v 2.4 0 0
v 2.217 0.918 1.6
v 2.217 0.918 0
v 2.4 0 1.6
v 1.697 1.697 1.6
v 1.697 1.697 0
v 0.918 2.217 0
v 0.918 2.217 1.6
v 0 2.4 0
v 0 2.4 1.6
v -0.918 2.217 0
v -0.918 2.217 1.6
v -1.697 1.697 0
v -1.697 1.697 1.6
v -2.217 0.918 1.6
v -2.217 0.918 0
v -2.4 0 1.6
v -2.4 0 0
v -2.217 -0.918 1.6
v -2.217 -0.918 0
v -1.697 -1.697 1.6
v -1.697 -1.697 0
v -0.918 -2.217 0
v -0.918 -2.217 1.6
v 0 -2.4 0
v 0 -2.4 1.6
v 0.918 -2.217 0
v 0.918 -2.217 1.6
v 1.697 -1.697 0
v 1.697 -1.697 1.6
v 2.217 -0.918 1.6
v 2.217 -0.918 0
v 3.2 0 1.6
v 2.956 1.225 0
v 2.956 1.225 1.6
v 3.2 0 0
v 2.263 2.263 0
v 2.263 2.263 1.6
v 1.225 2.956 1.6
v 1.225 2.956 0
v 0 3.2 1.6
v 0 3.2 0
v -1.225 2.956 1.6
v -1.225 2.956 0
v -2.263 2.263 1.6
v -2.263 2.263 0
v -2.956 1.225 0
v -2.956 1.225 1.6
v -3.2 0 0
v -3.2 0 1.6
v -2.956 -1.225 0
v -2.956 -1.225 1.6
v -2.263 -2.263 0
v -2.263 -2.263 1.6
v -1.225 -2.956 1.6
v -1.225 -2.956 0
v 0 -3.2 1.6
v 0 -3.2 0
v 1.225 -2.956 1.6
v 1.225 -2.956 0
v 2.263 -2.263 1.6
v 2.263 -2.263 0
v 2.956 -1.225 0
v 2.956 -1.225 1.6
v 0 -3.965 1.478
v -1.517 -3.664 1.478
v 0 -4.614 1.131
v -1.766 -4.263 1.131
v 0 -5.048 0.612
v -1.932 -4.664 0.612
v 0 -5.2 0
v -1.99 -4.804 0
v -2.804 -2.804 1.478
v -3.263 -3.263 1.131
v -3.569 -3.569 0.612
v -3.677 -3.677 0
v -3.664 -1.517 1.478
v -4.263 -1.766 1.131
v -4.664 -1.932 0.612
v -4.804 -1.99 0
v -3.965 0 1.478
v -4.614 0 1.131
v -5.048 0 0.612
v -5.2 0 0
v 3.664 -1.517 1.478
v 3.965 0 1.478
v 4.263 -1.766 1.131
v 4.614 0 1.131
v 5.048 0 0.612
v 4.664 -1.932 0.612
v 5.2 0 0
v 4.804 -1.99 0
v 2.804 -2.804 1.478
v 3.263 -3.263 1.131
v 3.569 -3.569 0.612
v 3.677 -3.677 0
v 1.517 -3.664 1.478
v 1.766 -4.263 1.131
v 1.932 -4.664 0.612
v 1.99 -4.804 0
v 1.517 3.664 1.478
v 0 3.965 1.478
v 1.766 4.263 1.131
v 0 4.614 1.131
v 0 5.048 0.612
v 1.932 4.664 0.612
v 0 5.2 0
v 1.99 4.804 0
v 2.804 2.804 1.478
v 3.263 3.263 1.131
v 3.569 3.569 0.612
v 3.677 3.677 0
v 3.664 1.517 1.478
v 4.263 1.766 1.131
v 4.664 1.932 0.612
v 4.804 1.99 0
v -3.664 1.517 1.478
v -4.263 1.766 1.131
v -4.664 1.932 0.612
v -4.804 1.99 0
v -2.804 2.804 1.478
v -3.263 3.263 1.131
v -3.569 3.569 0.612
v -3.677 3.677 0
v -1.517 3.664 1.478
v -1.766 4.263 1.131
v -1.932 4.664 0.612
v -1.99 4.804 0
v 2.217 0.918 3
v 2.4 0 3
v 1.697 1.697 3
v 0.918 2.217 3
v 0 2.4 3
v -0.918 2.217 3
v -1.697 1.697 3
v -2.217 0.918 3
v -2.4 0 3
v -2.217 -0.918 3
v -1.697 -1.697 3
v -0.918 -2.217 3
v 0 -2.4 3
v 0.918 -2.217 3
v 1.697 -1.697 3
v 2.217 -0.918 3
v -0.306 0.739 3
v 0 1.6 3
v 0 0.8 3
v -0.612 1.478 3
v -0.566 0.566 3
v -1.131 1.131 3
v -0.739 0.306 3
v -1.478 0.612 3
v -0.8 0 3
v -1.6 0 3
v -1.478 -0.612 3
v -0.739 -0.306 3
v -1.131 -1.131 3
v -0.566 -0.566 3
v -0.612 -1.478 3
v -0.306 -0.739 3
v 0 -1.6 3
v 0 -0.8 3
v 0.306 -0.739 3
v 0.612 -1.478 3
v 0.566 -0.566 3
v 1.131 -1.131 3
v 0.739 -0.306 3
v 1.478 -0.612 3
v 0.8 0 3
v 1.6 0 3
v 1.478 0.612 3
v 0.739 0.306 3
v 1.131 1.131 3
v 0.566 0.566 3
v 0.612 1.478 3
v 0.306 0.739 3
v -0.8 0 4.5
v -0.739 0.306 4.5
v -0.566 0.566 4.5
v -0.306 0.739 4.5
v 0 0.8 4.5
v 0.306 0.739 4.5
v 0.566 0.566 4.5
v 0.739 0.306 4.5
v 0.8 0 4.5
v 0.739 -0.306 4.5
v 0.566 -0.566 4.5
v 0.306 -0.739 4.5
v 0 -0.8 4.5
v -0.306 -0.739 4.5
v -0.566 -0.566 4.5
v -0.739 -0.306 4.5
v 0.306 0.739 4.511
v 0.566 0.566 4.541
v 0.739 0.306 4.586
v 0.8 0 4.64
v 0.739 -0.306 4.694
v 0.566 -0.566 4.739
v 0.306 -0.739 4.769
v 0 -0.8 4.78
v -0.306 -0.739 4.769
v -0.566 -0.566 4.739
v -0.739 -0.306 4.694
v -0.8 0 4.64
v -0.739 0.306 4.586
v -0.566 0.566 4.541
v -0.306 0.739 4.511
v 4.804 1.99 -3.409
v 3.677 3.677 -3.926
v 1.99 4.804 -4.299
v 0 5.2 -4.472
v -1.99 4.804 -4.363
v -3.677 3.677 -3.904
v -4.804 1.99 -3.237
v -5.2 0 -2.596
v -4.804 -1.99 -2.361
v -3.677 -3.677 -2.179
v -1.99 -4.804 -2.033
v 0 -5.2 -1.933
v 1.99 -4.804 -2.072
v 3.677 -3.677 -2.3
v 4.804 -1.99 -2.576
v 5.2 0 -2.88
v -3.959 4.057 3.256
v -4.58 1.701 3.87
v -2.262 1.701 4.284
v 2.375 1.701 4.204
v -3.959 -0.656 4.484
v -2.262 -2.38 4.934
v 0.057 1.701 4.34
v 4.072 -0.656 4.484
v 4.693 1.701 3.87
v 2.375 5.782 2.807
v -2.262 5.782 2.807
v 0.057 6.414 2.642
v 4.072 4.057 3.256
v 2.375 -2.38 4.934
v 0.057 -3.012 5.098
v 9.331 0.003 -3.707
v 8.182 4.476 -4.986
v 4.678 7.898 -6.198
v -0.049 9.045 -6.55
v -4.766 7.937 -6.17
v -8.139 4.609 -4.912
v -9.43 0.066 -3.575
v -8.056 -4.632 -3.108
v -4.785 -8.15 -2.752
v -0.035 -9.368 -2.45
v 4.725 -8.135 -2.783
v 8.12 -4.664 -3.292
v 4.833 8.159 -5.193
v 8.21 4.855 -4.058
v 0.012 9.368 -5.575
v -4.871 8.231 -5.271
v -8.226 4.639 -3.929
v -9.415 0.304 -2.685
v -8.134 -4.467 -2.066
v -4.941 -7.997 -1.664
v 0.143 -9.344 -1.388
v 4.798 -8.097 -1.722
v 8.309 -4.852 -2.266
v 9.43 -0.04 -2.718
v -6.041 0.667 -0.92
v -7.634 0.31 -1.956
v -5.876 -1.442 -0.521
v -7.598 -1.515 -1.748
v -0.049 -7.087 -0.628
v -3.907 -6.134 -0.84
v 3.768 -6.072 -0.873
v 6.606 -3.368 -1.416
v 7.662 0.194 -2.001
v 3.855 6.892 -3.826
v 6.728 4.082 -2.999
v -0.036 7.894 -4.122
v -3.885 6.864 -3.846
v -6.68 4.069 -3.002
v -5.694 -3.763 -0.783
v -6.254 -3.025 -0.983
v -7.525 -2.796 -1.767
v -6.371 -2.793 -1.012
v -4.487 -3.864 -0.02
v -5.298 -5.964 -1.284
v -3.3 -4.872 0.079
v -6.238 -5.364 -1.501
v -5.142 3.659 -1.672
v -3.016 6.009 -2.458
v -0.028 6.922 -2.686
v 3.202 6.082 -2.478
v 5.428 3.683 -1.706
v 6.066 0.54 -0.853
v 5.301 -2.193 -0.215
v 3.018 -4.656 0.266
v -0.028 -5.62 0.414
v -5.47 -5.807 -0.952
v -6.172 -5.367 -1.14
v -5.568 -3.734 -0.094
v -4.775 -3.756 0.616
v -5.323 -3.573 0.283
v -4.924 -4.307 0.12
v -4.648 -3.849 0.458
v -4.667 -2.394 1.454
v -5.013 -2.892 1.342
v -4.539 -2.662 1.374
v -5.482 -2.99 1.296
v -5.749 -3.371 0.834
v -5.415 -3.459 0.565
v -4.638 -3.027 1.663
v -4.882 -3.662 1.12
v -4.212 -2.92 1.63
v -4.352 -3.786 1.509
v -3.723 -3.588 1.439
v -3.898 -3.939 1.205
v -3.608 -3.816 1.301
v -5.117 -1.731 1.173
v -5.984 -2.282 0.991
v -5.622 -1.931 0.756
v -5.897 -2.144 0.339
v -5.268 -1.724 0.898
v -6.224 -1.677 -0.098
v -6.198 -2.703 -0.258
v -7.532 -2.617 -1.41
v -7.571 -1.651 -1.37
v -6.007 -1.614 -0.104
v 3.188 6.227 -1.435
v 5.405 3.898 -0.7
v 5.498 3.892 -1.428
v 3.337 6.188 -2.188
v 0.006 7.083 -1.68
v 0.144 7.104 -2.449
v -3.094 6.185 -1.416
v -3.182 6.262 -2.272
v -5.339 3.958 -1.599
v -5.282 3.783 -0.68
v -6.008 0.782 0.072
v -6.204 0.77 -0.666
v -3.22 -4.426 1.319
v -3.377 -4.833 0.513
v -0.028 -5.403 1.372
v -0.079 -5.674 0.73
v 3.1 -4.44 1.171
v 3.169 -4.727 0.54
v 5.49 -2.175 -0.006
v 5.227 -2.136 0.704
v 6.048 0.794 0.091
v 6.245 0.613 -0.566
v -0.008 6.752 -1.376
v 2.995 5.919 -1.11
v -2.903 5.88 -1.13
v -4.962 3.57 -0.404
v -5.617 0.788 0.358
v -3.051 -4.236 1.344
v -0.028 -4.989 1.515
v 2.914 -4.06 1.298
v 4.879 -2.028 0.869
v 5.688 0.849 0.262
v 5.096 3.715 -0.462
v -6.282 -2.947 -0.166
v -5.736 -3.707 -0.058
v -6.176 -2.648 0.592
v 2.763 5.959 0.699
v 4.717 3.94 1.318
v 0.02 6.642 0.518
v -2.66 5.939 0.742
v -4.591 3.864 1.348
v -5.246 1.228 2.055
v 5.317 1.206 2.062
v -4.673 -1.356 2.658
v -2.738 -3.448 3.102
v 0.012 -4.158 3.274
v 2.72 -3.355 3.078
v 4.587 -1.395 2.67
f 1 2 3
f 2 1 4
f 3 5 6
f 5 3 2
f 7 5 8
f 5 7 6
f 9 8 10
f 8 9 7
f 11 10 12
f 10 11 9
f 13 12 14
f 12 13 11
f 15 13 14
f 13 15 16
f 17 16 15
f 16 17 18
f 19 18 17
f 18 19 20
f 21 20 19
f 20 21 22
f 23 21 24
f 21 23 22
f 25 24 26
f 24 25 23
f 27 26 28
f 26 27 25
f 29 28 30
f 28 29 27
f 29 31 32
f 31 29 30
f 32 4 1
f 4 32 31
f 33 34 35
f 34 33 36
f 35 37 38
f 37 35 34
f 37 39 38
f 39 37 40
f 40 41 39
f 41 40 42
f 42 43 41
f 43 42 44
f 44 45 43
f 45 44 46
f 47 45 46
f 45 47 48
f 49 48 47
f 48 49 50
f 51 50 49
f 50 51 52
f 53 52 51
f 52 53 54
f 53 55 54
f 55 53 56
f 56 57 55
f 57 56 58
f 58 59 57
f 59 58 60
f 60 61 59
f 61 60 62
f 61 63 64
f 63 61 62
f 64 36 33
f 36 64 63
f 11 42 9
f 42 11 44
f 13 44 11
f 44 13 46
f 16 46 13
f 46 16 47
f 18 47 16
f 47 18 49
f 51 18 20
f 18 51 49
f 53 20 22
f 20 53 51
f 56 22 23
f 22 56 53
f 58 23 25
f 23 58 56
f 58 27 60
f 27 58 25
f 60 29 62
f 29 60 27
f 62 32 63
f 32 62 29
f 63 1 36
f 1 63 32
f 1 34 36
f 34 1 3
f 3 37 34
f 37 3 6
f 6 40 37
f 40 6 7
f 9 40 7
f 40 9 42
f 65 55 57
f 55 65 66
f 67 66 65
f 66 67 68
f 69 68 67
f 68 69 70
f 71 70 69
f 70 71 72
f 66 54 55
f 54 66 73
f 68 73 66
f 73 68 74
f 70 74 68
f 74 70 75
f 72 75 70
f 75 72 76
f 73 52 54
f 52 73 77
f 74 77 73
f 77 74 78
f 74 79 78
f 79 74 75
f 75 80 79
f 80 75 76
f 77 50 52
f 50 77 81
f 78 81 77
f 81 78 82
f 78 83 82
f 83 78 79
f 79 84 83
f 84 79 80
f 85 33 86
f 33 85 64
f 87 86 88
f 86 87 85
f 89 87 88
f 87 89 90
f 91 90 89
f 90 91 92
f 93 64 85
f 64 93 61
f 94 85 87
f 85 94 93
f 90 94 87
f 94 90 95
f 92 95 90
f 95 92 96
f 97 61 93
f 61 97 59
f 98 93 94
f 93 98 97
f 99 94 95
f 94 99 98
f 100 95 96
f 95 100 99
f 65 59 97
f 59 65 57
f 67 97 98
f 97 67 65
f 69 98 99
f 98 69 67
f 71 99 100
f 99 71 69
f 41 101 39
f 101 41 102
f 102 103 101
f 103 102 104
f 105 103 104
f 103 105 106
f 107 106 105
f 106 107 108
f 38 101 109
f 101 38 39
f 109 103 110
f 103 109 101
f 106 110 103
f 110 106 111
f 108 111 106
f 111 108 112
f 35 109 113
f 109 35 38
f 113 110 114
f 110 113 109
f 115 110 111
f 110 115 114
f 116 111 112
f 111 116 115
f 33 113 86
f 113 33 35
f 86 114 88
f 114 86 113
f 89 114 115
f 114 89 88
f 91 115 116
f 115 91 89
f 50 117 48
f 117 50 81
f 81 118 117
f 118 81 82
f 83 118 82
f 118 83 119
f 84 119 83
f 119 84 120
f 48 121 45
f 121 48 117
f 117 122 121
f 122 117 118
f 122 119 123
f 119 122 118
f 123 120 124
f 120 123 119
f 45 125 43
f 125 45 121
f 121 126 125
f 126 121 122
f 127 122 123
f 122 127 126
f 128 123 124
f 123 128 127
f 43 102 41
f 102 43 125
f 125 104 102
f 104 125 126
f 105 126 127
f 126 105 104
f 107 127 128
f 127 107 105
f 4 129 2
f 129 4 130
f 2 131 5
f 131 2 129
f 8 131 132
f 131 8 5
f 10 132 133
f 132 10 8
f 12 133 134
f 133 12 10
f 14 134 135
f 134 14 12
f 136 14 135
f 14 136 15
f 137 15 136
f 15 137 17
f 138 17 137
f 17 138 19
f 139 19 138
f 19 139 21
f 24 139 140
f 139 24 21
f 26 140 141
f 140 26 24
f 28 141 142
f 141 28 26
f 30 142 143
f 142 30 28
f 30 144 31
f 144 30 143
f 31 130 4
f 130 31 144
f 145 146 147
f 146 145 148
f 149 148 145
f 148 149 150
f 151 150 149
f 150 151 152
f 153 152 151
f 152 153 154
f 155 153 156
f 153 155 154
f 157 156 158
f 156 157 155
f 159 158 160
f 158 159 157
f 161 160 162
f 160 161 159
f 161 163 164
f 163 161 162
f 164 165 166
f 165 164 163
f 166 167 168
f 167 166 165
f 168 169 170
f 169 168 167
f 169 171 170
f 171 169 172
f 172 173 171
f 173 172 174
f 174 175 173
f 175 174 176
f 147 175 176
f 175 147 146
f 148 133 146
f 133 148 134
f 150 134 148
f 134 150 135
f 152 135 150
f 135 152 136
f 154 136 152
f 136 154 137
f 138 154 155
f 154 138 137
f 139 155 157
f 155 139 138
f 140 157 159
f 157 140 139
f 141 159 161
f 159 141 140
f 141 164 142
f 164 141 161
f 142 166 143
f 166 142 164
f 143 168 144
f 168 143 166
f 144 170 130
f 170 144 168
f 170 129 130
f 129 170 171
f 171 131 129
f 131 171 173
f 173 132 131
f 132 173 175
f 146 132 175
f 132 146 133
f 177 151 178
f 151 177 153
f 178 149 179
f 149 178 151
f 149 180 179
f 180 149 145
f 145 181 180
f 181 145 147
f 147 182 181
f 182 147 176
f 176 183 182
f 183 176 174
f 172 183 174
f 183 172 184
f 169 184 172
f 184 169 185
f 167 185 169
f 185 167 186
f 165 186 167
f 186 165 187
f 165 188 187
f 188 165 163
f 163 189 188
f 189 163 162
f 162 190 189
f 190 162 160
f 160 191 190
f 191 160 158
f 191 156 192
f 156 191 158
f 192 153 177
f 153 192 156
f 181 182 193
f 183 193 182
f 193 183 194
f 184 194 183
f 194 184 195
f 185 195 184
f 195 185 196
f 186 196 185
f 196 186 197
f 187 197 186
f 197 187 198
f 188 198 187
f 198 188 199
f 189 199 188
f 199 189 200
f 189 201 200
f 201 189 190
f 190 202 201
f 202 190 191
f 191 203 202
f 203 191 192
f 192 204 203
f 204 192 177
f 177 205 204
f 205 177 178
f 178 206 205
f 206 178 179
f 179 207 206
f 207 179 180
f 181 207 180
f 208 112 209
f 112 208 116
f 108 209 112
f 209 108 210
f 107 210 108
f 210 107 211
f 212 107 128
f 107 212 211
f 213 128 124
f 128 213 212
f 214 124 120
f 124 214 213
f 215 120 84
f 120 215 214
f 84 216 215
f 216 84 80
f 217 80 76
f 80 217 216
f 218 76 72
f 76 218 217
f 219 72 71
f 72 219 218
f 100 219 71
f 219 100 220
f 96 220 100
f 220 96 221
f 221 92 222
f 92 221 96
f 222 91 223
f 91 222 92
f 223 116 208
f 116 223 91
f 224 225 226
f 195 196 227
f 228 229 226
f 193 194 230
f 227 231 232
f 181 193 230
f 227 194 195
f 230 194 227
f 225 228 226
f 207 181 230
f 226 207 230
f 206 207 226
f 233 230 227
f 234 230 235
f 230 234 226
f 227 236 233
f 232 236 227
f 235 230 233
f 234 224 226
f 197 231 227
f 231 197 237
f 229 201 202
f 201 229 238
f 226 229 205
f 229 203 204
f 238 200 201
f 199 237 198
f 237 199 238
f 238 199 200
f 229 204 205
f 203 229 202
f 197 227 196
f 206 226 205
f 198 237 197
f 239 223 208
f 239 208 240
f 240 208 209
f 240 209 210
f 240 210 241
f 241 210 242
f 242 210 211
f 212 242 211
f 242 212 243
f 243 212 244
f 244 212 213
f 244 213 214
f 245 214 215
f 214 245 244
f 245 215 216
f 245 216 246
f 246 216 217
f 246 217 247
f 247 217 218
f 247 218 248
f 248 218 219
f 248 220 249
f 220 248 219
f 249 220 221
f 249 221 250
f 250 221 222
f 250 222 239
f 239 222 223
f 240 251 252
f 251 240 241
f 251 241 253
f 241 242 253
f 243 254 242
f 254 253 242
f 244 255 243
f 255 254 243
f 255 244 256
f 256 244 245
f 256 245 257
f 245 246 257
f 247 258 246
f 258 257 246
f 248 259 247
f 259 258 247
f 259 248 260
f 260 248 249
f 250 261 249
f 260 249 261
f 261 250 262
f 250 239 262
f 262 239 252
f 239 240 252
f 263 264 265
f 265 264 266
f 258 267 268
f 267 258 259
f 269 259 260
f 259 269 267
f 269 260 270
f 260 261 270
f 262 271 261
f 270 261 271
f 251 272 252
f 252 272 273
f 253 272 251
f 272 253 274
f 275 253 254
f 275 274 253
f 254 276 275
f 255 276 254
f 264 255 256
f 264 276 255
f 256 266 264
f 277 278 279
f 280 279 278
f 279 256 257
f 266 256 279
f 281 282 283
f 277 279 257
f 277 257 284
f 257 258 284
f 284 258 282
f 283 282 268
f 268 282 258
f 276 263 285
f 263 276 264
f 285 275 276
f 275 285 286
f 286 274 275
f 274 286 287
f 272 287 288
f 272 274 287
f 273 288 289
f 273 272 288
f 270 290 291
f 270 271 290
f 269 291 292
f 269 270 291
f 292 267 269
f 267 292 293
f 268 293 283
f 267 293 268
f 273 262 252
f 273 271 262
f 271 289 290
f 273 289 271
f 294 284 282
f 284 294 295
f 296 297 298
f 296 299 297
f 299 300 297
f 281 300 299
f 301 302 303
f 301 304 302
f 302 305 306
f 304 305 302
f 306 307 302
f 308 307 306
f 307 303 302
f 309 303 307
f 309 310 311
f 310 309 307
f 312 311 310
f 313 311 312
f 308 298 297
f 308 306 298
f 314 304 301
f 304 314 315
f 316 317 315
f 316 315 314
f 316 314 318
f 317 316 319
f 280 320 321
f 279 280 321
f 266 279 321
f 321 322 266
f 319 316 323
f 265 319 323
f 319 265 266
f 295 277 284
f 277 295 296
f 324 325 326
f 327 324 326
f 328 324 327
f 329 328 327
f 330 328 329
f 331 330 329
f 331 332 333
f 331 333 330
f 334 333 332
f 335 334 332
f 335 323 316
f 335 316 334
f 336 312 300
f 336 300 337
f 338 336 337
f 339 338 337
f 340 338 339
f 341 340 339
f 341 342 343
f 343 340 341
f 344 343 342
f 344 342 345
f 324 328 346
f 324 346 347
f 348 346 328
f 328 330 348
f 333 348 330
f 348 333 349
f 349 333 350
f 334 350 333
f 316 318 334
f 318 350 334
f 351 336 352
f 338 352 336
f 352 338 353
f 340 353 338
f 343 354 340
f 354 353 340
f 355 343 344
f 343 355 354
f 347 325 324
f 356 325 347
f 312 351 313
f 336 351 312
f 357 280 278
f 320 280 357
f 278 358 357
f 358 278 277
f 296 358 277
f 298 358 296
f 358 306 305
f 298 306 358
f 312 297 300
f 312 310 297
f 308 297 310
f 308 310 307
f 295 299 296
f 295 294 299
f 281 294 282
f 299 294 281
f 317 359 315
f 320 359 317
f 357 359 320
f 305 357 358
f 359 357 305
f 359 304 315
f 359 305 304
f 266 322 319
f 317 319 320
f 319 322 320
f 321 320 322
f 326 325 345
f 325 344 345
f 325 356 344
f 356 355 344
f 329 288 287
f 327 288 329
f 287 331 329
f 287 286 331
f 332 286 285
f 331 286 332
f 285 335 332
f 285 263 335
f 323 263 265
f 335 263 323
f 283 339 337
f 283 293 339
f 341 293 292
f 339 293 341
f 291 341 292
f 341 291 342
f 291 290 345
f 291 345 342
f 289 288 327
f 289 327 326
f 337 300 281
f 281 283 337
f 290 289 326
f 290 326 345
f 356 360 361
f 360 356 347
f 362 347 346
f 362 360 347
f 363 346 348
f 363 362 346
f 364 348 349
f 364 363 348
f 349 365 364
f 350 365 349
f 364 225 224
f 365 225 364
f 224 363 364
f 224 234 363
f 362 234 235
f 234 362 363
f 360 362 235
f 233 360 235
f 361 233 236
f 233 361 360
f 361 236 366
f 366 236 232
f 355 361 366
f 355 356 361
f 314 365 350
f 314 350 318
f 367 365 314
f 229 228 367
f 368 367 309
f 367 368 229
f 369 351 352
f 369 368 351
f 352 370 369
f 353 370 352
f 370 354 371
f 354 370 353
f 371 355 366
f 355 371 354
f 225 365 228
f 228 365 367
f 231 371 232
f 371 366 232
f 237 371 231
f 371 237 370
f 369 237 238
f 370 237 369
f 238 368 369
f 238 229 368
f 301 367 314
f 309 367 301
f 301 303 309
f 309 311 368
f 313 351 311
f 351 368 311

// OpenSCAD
use <../lib.scad>
use <s/13788s01.scad>
use <s/13788s02.scad>
$fa=1; $fs=0.2;
function ldraw_lib__13788(realsolid=false) = [
// 0 Minifig Hat with Wide Brim Down
// 0 Name: 13788.dat
// 0 Author: Stan Isachenko [angmarec]
// 0 !LDRAW_ORG Part UPDATE 2014-01
// 0 !LICENSE Licensed under CC BY 2.0 and CC BY 4.0 : see CAreadme.txt
// 
// 0 BFC CERTIFY CCW
  [0,"BFC","CERTIFY"],
  [0,"BFC","CCW"],
// 
// 0 !CATEGORY Minifig Headwear
// 
// 0 !HISTORY 2014-01-08 {LEGO Digital Designer} Original part shape
// 0 !HISTORY 2014-01-08 [angmarec] File preparation for LDraw Parts Tracker
// 0 !HISTORY 2014-01-19 [MagFors] Rearranged subfiles structure
// 0 !HISTORY 2014-06-21 [PTadmin] Official Update 2014-01
// 
// 
// 1 16 0 0 0 1 0 0 0 1 0 0 0 1 s\13788s01.dat
  [1,16,0,0,0,1,0,0,0,1,0,0,0,1, ldraw_lib__s__13788s01(realsolid)],
// 1 16 0 0 0 1 0 0 0 1 0 0 0 1 s\13788s02.dat
  [1,16,0,0,0,1,0,0,0,1,0,0,0,1, ldraw_lib__s__13788s02(realsolid)],
// 
// 0 // outside surface
// 4 16 6.907 -1.747 14.898 11.792 -3.294 9.851 12.74 1.155 9.288 7.488 2.776 14.797
  [4,16,6.907,-1.747,14.898,11.792,-3.294,9.851,12.74,1.155,9.288,7.488,2.776,14.797],
// 3 16 0.051 -1.296 16.604 7.488 2.776 14.797 -0.02 3.441 16.88
  [3,16,0.051,-1.296,16.604,7.488,2.776,14.797,-0.02,3.441,16.88],
// 3 16 0.051 -1.296 16.604 6.907 -1.747 14.898 7.488 2.776 14.797
  [3,16,0.051,-1.296,16.604,6.907,-1.747,14.898,7.488,2.776,14.797],
// 3 16 -6.649 -1.855 14.847 -0.02 3.441 16.88 -7.258 2.825 14.701
  [3,16,-6.649,-1.855,14.847,-0.02,3.441,16.88,-7.258,2.825,14.701],
// 3 16 -6.649 -1.855 14.847 0.051 -1.296 16.604 -0.02 3.441 16.88
  [3,16,-6.649,-1.855,14.847,0.051,-1.296,16.604,-0.02,3.441,16.88],
// 3 16 -11.478 -3.371 9.659 -7.258 2.825 14.701 -12.405 1.01 8.925
  [3,16,-11.478,-3.371,9.659,-7.258,2.825,14.701,-12.405,1.01,8.925],
// 3 16 -11.478 -3.371 9.659 -6.649 -1.855 14.847 -7.258 2.825 14.701
  [3,16,-11.478,-3.371,9.659,-6.649,-1.855,14.847,-7.258,2.825,14.701],
// 3 16 -12.405 1.01 8.925 -13.115 -5.138 3.069 -11.478 -3.371 9.659
  [3,16,-12.405,1.01,8.925,-13.115,-5.138,3.069,-11.478,-3.371,9.659],
// 3 16 -14.043 -0.895 1.971 -13.115 -5.138 3.069 -12.405 1.01 8.925
  [3,16,-14.043,-0.895,1.971,-13.115,-5.138,3.069,-12.405,1.01,8.925],
// 3 16 -11.478 -3.371 9.659 -11.45 -9.676 4.252 -9.897 -8.14 10.143
  [3,16,-11.478,-3.371,9.659,-11.45,-9.676,4.252,-9.897,-8.14,10.143],
// 3 16 -13.115 -5.138 3.069 -11.45 -9.676 4.252 -11.478 -3.371 9.659
  [3,16,-13.115,-5.138,3.069,-11.45,-9.676,4.252,-11.478,-3.371,9.659],
// 3 16 -9.897 -8.14 10.143 -6.649 -1.855 14.847 -11.478 -3.371 9.659
  [3,16,-9.897,-8.14,10.143,-6.649,-1.855,14.847,-11.478,-3.371,9.659],
// 3 16 -9.897 -8.14 10.143 -5.654 -7.017 14.456 -6.649 -1.855 14.847
  [3,16,-9.897,-8.14,10.143,-5.654,-7.017,14.456,-6.649,-1.855,14.847],
// 4 16 -5.654 -7.017 14.456 0.142 -6.605 16.034 0.051 -1.296 16.604 -6.649 -1.855 14.847
  [4,16,-5.654,-7.017,14.456,0.142,-6.605,16.034,0.051,-1.296,16.604,-6.649,-1.855,14.847],
// 3 16 6.907 -1.747 14.898 0.051 -1.296 16.604 0.142 -6.605 16.034
  [3,16,6.907,-1.747,14.898,0.051,-1.296,16.604,0.142,-6.605,16.034],
// 3 16 5.937 -7.017 14.456 6.907 -1.747 14.898 0.142 -6.605 16.034
  [3,16,5.937,-7.017,14.456,6.907,-1.747,14.898,0.142,-6.605,16.034],
// 4 16 11.792 -3.294 9.851 6.907 -1.747 14.898 5.937 -7.017 14.456 10.18 -8.14 10.143
  [4,16,11.792,-3.294,9.851,6.907,-1.747,14.898,5.937,-7.017,14.456,10.18,-8.14,10.143],
// 3 16 11.792 -3.294 9.851 10.18 -8.14 10.143 13.293 -5.156 3.016
  [3,16,11.792,-3.294,9.851,10.18,-8.14,10.143,13.293,-5.156,3.016],
// 3 16 13.293 -5.156 3.016 10.18 -8.14 10.143 11.733 -9.676 4.252
  [3,16,13.293,-5.156,3.016,10.18,-8.14,10.143,11.733,-9.676,4.252],
// 3 16 14.219 -0.654 2.122 11.792 -3.294 9.851 13.293 -5.156 3.016
  [3,16,14.219,-0.654,2.122,11.792,-3.294,9.851,13.293,-5.156,3.016],
// 3 16 14.219 -0.654 2.122 12.74 1.155 9.288 11.792 -3.294 9.851
  [3,16,14.219,-0.654,2.122,12.74,1.155,9.288,11.792,-3.294,9.851],
// 3 16 -12.792 -2.933 -4.328 -13.115 -5.138 3.069 -14.043 -0.895 1.971
  [3,16,-12.792,-2.933,-4.328,-13.115,-5.138,3.069,-14.043,-0.895,1.971],
// 3 16 -12.792 -2.933 -4.328 -14.043 -0.895 1.971 -13.17 -2.244 -4.31
  [3,16,-12.792,-2.933,-4.328,-14.043,-0.895,1.971,-13.17,-2.244,-4.31],
// 3 16 -11.683 -6.645 -3.391 -13.115 -5.138 3.069 -12.792 -2.933 -4.328
  [3,16,-11.683,-6.645,-3.391,-13.115,-5.138,3.069,-12.792,-2.933,-4.328],
// 3 16 -5.654 -12.335 -5.951 -9.897 -11.211 -1.639 -11.683 -6.645 -3.391
  [3,16,-5.654,-12.335,-5.951,-9.897,-11.211,-1.639,-11.683,-6.645,-3.391],
// 4 16 -6.846 -7.755 -8.62 -5.654 -12.335 -5.951 -11.683 -6.645 -3.391 -10.531 -4.075 -7.3
  [4,16,-6.846,-7.755,-8.62,-5.654,-12.335,-5.951,-11.683,-6.645,-3.391,-10.531,-4.075,-7.3],
// 3 16 0.031 -8.185 -10.395 -7.628 -3.36 -10.591 -0.07 -3.788 -12.472
  [3,16,0.031,-8.185,-10.395,-7.628,-3.36,-10.591,-0.07,-3.788,-12.472],
// 3 16 0.031 -8.185 -10.395 -6.846 -7.755 -8.62 -7.628 -3.36 -10.591
  [3,16,0.031,-8.185,-10.395,-6.846,-7.755,-8.62,-7.628,-3.36,-10.591],
// 3 16 -0.07 -3.788 -12.472 6.8 -7.694 -8.387 0.031 -8.185 -10.395
  [3,16,-0.07,-3.788,-12.472,6.8,-7.694,-8.387,0.031,-8.185,-10.395],
// 3 16 7.286 -3.244 -10.151 6.8 -7.694 -8.387 -0.07 -3.788 -12.472
  [3,16,7.286,-3.244,-10.151,6.8,-7.694,-8.387,-0.07,-3.788,-12.472],
// 4 16 11.467 -6.674 -3.488 6.8 -7.694 -8.387 7.286 -3.244 -10.151 12.198 -2.173 -5.07
  [4,16,11.467,-6.674,-3.488,6.8,-7.694,-8.387,7.286,-3.244,-10.151,12.198,-2.173,-5.07],
// 4 16 13.293 -5.156 3.016 11.467 -6.674 -3.488 12.198 -2.173 -5.07 14.219 -0.654 2.122
  [4,16,13.293,-5.156,3.016,11.467,-6.674,-3.488,12.198,-2.173,-5.07,14.219,-0.654,2.122],
// 3 16 -11.45 -9.676 4.252 -13.115 -5.138 3.069 -9.897 -11.211 -1.639
  [3,16,-11.45,-9.676,4.252,-13.115,-5.138,3.069,-9.897,-11.211,-1.639],
// 3 16 -9.897 -11.211 -1.639 -13.115 -5.138 3.069 -11.683 -6.645 -3.391
  [3,16,-9.897,-11.211,-1.639,-13.115,-5.138,3.069,-11.683,-6.645,-3.391],
// 3 16 10.18 -11.211 -1.639 11.467 -6.674 -3.488 11.733 -9.676 4.252
  [3,16,10.18,-11.211,-1.639,11.467,-6.674,-3.488,11.733,-9.676,4.252],
// 3 16 11.467 -6.674 -3.488 13.293 -5.156 3.016 11.733 -9.676 4.252
  [3,16,11.467,-6.674,-3.488,13.293,-5.156,3.016,11.733,-9.676,4.252],
// 4 16 10.18 -11.211 -1.639 5.937 -12.335 -5.951 6.8 -7.694 -8.387 11.467 -6.674 -3.488
  [4,16,10.18,-11.211,-1.639,5.937,-12.335,-5.951,6.8,-7.694,-8.387,11.467,-6.674,-3.488],
// 3 16 0.031 -8.185 -10.395 5.937 -12.335 -5.951 0.142 -12.746 -7.53
  [3,16,0.031,-8.185,-10.395,5.937,-12.335,-5.951,0.142,-12.746,-7.53],
// 3 16 6.8 -7.694 -8.387 5.937 -12.335 -5.951 0.031 -8.185 -10.395
  [3,16,6.8,-7.694,-8.387,5.937,-12.335,-5.951,0.031,-8.185,-10.395],
// 3 16 0.142 -12.746 -7.53 -6.846 -7.755 -8.62 0.031 -8.185 -10.395
  [3,16,0.142,-12.746,-7.53,-6.846,-7.755,-8.62,0.031,-8.185,-10.395],
// 3 16 0.142 -12.746 -7.53 -5.654 -12.335 -5.951 -6.846 -7.755 -8.62
  [3,16,0.142,-12.746,-7.53,-5.654,-12.335,-5.951,-6.846,-7.755,-8.62],
// 3 16 -11.667 -3.635 -5.986 -11.683 -6.645 -3.391 -12.792 -2.933 -4.328
  [3,16,-11.667,-3.635,-5.986,-11.683,-6.645,-3.391,-12.792,-2.933,-4.328],
// 3 16 -10.531 -4.075 -7.3 -11.683 -6.645 -3.391 -11.667 -3.635 -5.986
  [3,16,-10.531,-4.075,-7.3,-11.683,-6.645,-3.391,-11.667,-3.635,-5.986],
// 3 16 -11.667 -3.635 -5.986 -11.348 -3.434 -6.656 -10.531 -4.075 -7.3
  [3,16,-11.667,-3.635,-5.986,-11.348,-3.434,-6.656,-10.531,-4.075,-7.3],
// 3 16 -10.531 -4.075 -7.3 -9.307 -3.597 -8.97 -6.846 -7.755 -8.62
  [3,16,-10.531,-4.075,-7.3,-9.307,-3.597,-8.97,-6.846,-7.755,-8.62],
// 3 16 -9.019 -3.253 -9.541 -7.628 -3.36 -10.591 -9.307 -3.597 -8.97
  [3,16,-9.019,-3.253,-9.541,-7.628,-3.36,-10.591,-9.307,-3.597,-8.97],
// 3 16 -7.628 -3.36 -10.591 -6.846 -7.755 -8.62 -9.307 -3.597 -8.97
  [3,16,-7.628,-3.36,-10.591,-6.846,-7.755,-8.62,-9.307,-3.597,-8.97],
// 5 24 11.792 -3.294 9.851 12.74 1.155 9.288 6.907 -1.747 14.898 14.219 -0.654 2.122
  [5,24,11.792,-3.294,9.851,12.74,1.155,9.288,6.907,-1.747,14.898,14.219,-0.654,2.122],
// 5 24 6.907 -1.747 14.898 11.792 -3.294 9.851 12.74 1.155 9.288 5.937 -7.017 14.456
  [5,24,6.907,-1.747,14.898,11.792,-3.294,9.851,12.74,1.155,9.288,5.937,-7.017,14.456],
// 5 24 7.488 2.776 14.797 6.907 -1.747 14.898 12.74 1.155 9.288 0.051 -1.296 16.604
  [5,24,7.488,2.776,14.797,6.907,-1.747,14.898,12.74,1.155,9.288,0.051,-1.296,16.604],
// 5 24 -0.02 3.441 16.88 0.051 -1.296 16.604 7.488 2.776 14.797 -6.649 -1.855 14.847
  [5,24,-0.02,3.441,16.88,0.051,-1.296,16.604,7.488,2.776,14.797,-6.649,-1.855,14.847],
// 5 24 0.051 -1.296 16.604 7.488 2.776 14.797 -0.02 3.441 16.88 6.907 -1.747 14.898
  [5,24,0.051,-1.296,16.604,7.488,2.776,14.797,-0.02,3.441,16.88,6.907,-1.747,14.898],
// 5 24 0.051 -1.296 16.604 6.907 -1.747 14.898 7.488 2.776 14.797 0.142 -6.605 16.034
  [5,24,0.051,-1.296,16.604,6.907,-1.747,14.898,7.488,2.776,14.797,0.142,-6.605,16.034],
// 5 24 -7.258 2.825 14.701 -6.649 -1.855 14.847 -0.02 3.441 16.88 -11.478 -3.371 9.659
  [5,24,-7.258,2.825,14.701,-6.649,-1.855,14.847,-0.02,3.441,16.88,-11.478,-3.371,9.659],
// 5 24 -6.649 -1.855 14.847 -0.02 3.441 16.88 -7.258 2.825 14.701 0.051 -1.296 16.604
  [5,24,-6.649,-1.855,14.847,-0.02,3.441,16.88,-7.258,2.825,14.701,0.051,-1.296,16.604],
// 5 24 -6.649 -1.855 14.847 0.051 -1.296 16.604 -0.02 3.441 16.88 -5.654 -7.017 14.456
  [5,24,-6.649,-1.855,14.847,0.051,-1.296,16.604,-0.02,3.441,16.88,-5.654,-7.017,14.456],
// 5 24 -12.405 1.01 8.925 -11.478 -3.371 9.659 -7.258 2.825 14.701 -13.115 -5.138 3.069
  [5,24,-12.405,1.01,8.925,-11.478,-3.371,9.659,-7.258,2.825,14.701,-13.115,-5.138,3.069],
// 5 24 -11.478 -3.371 9.659 -7.258 2.825 14.701 -12.405 1.01 8.925 -6.649 -1.855 14.847
  [5,24,-11.478,-3.371,9.659,-7.258,2.825,14.701,-12.405,1.01,8.925,-6.649,-1.855,14.847],
// 5 24 -11.478 -3.371 9.659 -6.649 -1.855 14.847 -7.258 2.825 14.701 -9.897 -8.14 10.143
  [5,24,-11.478,-3.371,9.659,-6.649,-1.855,14.847,-7.258,2.825,14.701,-9.897,-8.14,10.143],
// 5 24 -12.405 1.01 8.925 -13.115 -5.138 3.069 -11.478 -3.371 9.659 -14.043 -0.895 1.971
  [5,24,-12.405,1.01,8.925,-13.115,-5.138,3.069,-11.478,-3.371,9.659,-14.043,-0.895,1.971],
// 5 24 -13.115 -5.138 3.069 -11.478 -3.371 9.659 -12.405 1.01 8.925 -11.45 -9.676 4.252
  [5,24,-13.115,-5.138,3.069,-11.478,-3.371,9.659,-12.405,1.01,8.925,-11.45,-9.676,4.252],
// 5 24 -14.043 -0.895 1.971 -13.115 -5.138 3.069 -12.405 1.01 8.925 -12.792 -2.933 -4.328
  [5,24,-14.043,-0.895,1.971,-13.115,-5.138,3.069,-12.405,1.01,8.925,-12.792,-2.933,-4.328],
// 5 24 -9.897 -8.14 10.143 -11.478 -3.371 9.659 -11.45 -9.676 4.252 -6.649 -1.855 14.847
  [5,24,-9.897,-8.14,10.143,-11.478,-3.371,9.659,-11.45,-9.676,4.252,-6.649,-1.855,14.847],
// 5 24 -11.478 -3.371 9.659 -11.45 -9.676 4.252 -9.897 -8.14 10.143 -13.115 -5.138 3.069
  [5,24,-11.478,-3.371,9.659,-11.45,-9.676,4.252,-9.897,-8.14,10.143,-13.115,-5.138,3.069],
// 5 24 -13.115 -5.138 3.069 -11.45 -9.676 4.252 -11.478 -3.371 9.659 -9.897 -11.211 -1.639
  [5,24,-13.115,-5.138,3.069,-11.45,-9.676,4.252,-11.478,-3.371,9.659,-9.897,-11.211,-1.639],
// 5 24 -9.897 -8.14 10.143 -6.649 -1.855 14.847 -11.478 -3.371 9.659 -5.654 -7.017 14.456
  [5,24,-9.897,-8.14,10.143,-6.649,-1.855,14.847,-11.478,-3.371,9.659,-5.654,-7.017,14.456],
// 5 24 -5.654 -7.017 14.456 -6.649 -1.855 14.847 -9.897 -8.14 10.143 0.051 -1.296 16.604
  [5,24,-5.654,-7.017,14.456,-6.649,-1.855,14.847,-9.897,-8.14,10.143,0.051,-1.296,16.604],
// 5 24 0.142 -6.605 16.034 0.051 -1.296 16.604 -5.654 -7.017 14.456 6.907 -1.747 14.898
  [5,24,0.142,-6.605,16.034,0.051,-1.296,16.604,-5.654,-7.017,14.456,6.907,-1.747,14.898],
// 5 24 0.142 -6.605 16.034 6.907 -1.747 14.898 0.051 -1.296 16.604 5.937 -7.017 14.456
  [5,24,0.142,-6.605,16.034,6.907,-1.747,14.898,0.051,-1.296,16.604,5.937,-7.017,14.456],
// 5 24 5.937 -7.017 14.456 6.907 -1.747 14.898 0.142 -6.605 16.034 11.792 -3.294 9.851
  [5,24,5.937,-7.017,14.456,6.907,-1.747,14.898,0.142,-6.605,16.034,11.792,-3.294,9.851],
// 5 24 10.18 -8.14 10.143 11.792 -3.294 9.851 5.937 -7.017 14.456 13.293 -5.156 3.016
  [5,24,10.18,-8.14,10.143,11.792,-3.294,9.851,5.937,-7.017,14.456,13.293,-5.156,3.016],
// 5 24 10.18 -8.14 10.143 13.293 -5.156 3.016 11.792 -3.294 9.851 11.733 -9.676 4.252
  [5,24,10.18,-8.14,10.143,13.293,-5.156,3.016,11.792,-3.294,9.851,11.733,-9.676,4.252],
// 5 24 13.293 -5.156 3.016 11.792 -3.294 9.851 10.18 -8.14 10.143 14.219 -0.654 2.122
  [5,24,13.293,-5.156,3.016,11.792,-3.294,9.851,10.18,-8.14,10.143,14.219,-0.654,2.122],
// 5 24 11.733 -9.676 4.252 13.293 -5.156 3.016 10.18 -8.14 10.143 11.467 -6.674 -3.488
  [5,24,11.733,-9.676,4.252,13.293,-5.156,3.016,10.18,-8.14,10.143,11.467,-6.674,-3.488],
// 5 24 13.293 -5.156 3.016 14.219 -0.654 2.122 11.792 -3.294 9.851 12.198 -2.173 -5.07
  [5,24,13.293,-5.156,3.016,14.219,-0.654,2.122,11.792,-3.294,9.851,12.198,-2.173,-5.07],
// 5 24 14.219 -0.654 2.122 11.792 -3.294 9.851 13.293 -5.156 3.016 12.74 1.155 9.288
  [5,24,14.219,-0.654,2.122,11.792,-3.294,9.851,13.293,-5.156,3.016,12.74,1.155,9.288],
// 5 24 -14.043 -0.895 1.971 -12.792 -2.933 -4.328 -13.115 -5.138 3.069 -13.17 -2.244 -4.31
  [5,24,-14.043,-0.895,1.971,-12.792,-2.933,-4.328,-13.115,-5.138,3.069,-13.17,-2.244,-4.31],
// 5 24 -12.792 -2.933 -4.328 -13.115 -5.138 3.069 -14.043 -0.895 1.971 -11.683 -6.645 -3.391
  [5,24,-12.792,-2.933,-4.328,-13.115,-5.138,3.069,-14.043,-0.895,1.971,-11.683,-6.645,-3.391],
// 5 24 -12.792 -2.933 -4.328 -11.683 -6.645 -3.391 -13.115 -5.138 3.069 -11.667 -3.635 -5.986
  [5,24,-12.792,-2.933,-4.328,-11.683,-6.645,-3.391,-13.115,-5.138,3.069,-11.667,-3.635,-5.986],
// 5 24 -11.683 -6.645 -3.391 -13.115 -5.138 3.069 -12.792 -2.933 -4.328 -9.897 -11.211 -1.639
  [5,24,-11.683,-6.645,-3.391,-13.115,-5.138,3.069,-12.792,-2.933,-4.328,-9.897,-11.211,-1.639],
// 5 24 -9.897 -11.211 -1.639 -11.683 -6.645 -3.391 -5.654 -12.335 -5.951 -13.115 -5.138 3.069
  [5,24,-9.897,-11.211,-1.639,-11.683,-6.645,-3.391,-5.654,-12.335,-5.951,-13.115,-5.138,3.069],
// 5 24 -11.683 -6.645 -3.391 -5.654 -12.335 -5.951 -9.897 -11.211 -1.639 -6.846 -7.755 -8.62
  [5,24,-11.683,-6.645,-3.391,-5.654,-12.335,-5.951,-9.897,-11.211,-1.639,-6.846,-7.755,-8.62],
// 5 24 -6.846 -7.755 -8.62 -5.654 -12.335 -5.951 -11.683 -6.645 -3.391 0.142 -12.746 -7.53
  [5,24,-6.846,-7.755,-8.62,-5.654,-12.335,-5.951,-11.683,-6.645,-3.391,0.142,-12.746,-7.53],
// 5 24 -0.07 -3.788 -12.472 0.031 -8.185 -10.395 -7.628 -3.36 -10.591 6.8 -7.694 -8.387
  [5,24,-0.07,-3.788,-12.472,0.031,-8.185,-10.395,-7.628,-3.36,-10.591,6.8,-7.694,-8.387],
// 5 24 0.031 -8.185 -10.395 -7.628 -3.36 -10.591 -0.07 -3.788 -12.472 -6.846 -7.755 -8.62
  [5,24,0.031,-8.185,-10.395,-7.628,-3.36,-10.591,-0.07,-3.788,-12.472,-6.846,-7.755,-8.62],
// 5 24 0.031 -8.185 -10.395 -6.846 -7.755 -8.62 -7.628 -3.36 -10.591 0.142 -12.746 -7.53
  [5,24,0.031,-8.185,-10.395,-6.846,-7.755,-8.62,-7.628,-3.36,-10.591,0.142,-12.746,-7.53],
// 5 24 -6.846 -7.755 -8.62 -7.628 -3.36 -10.591 0.031 -8.185 -10.395 -9.307 -3.597 -8.97
  [5,24,-6.846,-7.755,-8.62,-7.628,-3.36,-10.591,0.031,-8.185,-10.395,-9.307,-3.597,-8.97],
// 5 24 -0.07 -3.788 -12.472 6.8 -7.694 -8.387 0.031 -8.185 -10.395 7.286 -3.244 -10.151
  [5,24,-0.07,-3.788,-12.472,6.8,-7.694,-8.387,0.031,-8.185,-10.395,7.286,-3.244,-10.151],
// 5 24 6.8 -7.694 -8.387 0.031 -8.185 -10.395 -0.07 -3.788 -12.472 5.937 -12.335 -5.951
  [5,24,6.8,-7.694,-8.387,0.031,-8.185,-10.395,-0.07,-3.788,-12.472,5.937,-12.335,-5.951],
// 5 24 7.286 -3.244 -10.151 6.8 -7.694 -8.387 -0.07 -3.788 -12.472 11.467 -6.674 -3.488
  [5,24,7.286,-3.244,-10.151,6.8,-7.694,-8.387,-0.07,-3.788,-12.472,11.467,-6.674,-3.488],
// 5 24 11.467 -6.674 -3.488 6.8 -7.694 -8.387 7.286 -3.244 -10.151 10.18 -11.211 -1.639
  [5,24,11.467,-6.674,-3.488,6.8,-7.694,-8.387,7.286,-3.244,-10.151,10.18,-11.211,-1.639],
// 5 24 12.198 -2.173 -5.07 11.467 -6.674 -3.488 7.286 -3.244 -10.151 13.293 -5.156 3.016
  [5,24,12.198,-2.173,-5.07,11.467,-6.674,-3.488,7.286,-3.244,-10.151,13.293,-5.156,3.016],
// 5 24 13.293 -5.156 3.016 11.467 -6.674 -3.488 12.198 -2.173 -5.07 11.733 -9.676 4.252
  [5,24,13.293,-5.156,3.016,11.467,-6.674,-3.488,12.198,-2.173,-5.07,11.733,-9.676,4.252],
// 5 24 -13.115 -5.138 3.069 -9.897 -11.211 -1.639 -11.45 -9.676 4.252 -11.683 -6.645 -3.391
  [5,24,-13.115,-5.138,3.069,-9.897,-11.211,-1.639,-11.45,-9.676,4.252,-11.683,-6.645,-3.391],
// 5 24 10.18 -11.211 -1.639 11.467 -6.674 -3.488 11.733 -9.676 4.252 6.8 -7.694 -8.387
  [5,24,10.18,-11.211,-1.639,11.467,-6.674,-3.488,11.733,-9.676,4.252,6.8,-7.694,-8.387],
// 5 24 11.467 -6.674 -3.488 11.733 -9.676 4.252 10.18 -11.211 -1.639 13.293 -5.156 3.016
  [5,24,11.467,-6.674,-3.488,11.733,-9.676,4.252,10.18,-11.211,-1.639,13.293,-5.156,3.016],
// 5 24 5.937 -12.335 -5.951 6.8 -7.694 -8.387 10.18 -11.211 -1.639 0.031 -8.185 -10.395
  [5,24,5.937,-12.335,-5.951,6.8,-7.694,-8.387,10.18,-11.211,-1.639,0.031,-8.185,-10.395],
// 5 24 0.142 -12.746 -7.53 0.031 -8.185 -10.395 5.937 -12.335 -5.951 -6.846 -7.755 -8.62
  [5,24,0.142,-12.746,-7.53,0.031,-8.185,-10.395,5.937,-12.335,-5.951,-6.846,-7.755,-8.62],
// 5 24 0.031 -8.185 -10.395 5.937 -12.335 -5.951 0.142 -12.746 -7.53 6.8 -7.694 -8.387
  [5,24,0.031,-8.185,-10.395,5.937,-12.335,-5.951,0.142,-12.746,-7.53,6.8,-7.694,-8.387],
// 5 24 0.142 -12.746 -7.53 -6.846 -7.755 -8.62 0.031 -8.185 -10.395 -5.654 -12.335 -5.951
  [5,24,0.142,-12.746,-7.53,-6.846,-7.755,-8.62,0.031,-8.185,-10.395,-5.654,-12.335,-5.951],
// 5 24 -11.667 -3.635 -5.986 -11.683 -6.645 -3.391 -12.792 -2.933 -4.328 -10.531 -4.075 -7.3
  [5,24,-11.667,-3.635,-5.986,-11.683,-6.645,-3.391,-12.792,-2.933,-4.328,-10.531,-4.075,-7.3],
// 5 24 -11.683 -6.645 -3.391 -10.531 -4.075 -7.3 -6.846 -7.755 -8.62 -11.667 -3.635 -5.986
  [5,24,-11.683,-6.645,-3.391,-10.531,-4.075,-7.3,-6.846,-7.755,-8.62,-11.667,-3.635,-5.986],
// 5 24 -10.531 -4.075 -7.3 -6.846 -7.755 -8.62 -11.683 -6.645 -3.391 -9.307 -3.597 -8.97
  [5,24,-10.531,-4.075,-7.3,-6.846,-7.755,-8.62,-11.683,-6.645,-3.391,-9.307,-3.597,-8.97],
// 5 24 -11.667 -3.635 -5.986 -10.531 -4.075 -7.3 -11.683 -6.645 -3.391 -11.348 -3.434 -6.656
  [5,24,-11.667,-3.635,-5.986,-10.531,-4.075,-7.3,-11.683,-6.645,-3.391,-11.348,-3.434,-6.656],
// 5 24 -9.307 -3.597 -8.97 -6.846 -7.755 -8.62 -10.531 -4.075 -7.3 -7.628 -3.36 -10.591
  [5,24,-9.307,-3.597,-8.97,-6.846,-7.755,-8.62,-10.531,-4.075,-7.3,-7.628,-3.36,-10.591],
// 5 24 -7.628 -3.36 -10.591 -9.307 -3.597 -8.97 -9.019 -3.253 -9.541 -6.846 -7.755 -8.62
  [5,24,-7.628,-3.36,-10.591,-9.307,-3.597,-8.97,-9.019,-3.253,-9.541,-6.846,-7.755,-8.62],
];
module ldraw_lib__13788(step=0, col=false, unit=2/5, alt=false, line=0.2, solid=!$preview)
    makepoly(ldraw_lib__13788(solid), step=step, col=col, unit=unit, alt=alt, line=line, solid=solid);
ldraw_lib__13788(line=0.2);
